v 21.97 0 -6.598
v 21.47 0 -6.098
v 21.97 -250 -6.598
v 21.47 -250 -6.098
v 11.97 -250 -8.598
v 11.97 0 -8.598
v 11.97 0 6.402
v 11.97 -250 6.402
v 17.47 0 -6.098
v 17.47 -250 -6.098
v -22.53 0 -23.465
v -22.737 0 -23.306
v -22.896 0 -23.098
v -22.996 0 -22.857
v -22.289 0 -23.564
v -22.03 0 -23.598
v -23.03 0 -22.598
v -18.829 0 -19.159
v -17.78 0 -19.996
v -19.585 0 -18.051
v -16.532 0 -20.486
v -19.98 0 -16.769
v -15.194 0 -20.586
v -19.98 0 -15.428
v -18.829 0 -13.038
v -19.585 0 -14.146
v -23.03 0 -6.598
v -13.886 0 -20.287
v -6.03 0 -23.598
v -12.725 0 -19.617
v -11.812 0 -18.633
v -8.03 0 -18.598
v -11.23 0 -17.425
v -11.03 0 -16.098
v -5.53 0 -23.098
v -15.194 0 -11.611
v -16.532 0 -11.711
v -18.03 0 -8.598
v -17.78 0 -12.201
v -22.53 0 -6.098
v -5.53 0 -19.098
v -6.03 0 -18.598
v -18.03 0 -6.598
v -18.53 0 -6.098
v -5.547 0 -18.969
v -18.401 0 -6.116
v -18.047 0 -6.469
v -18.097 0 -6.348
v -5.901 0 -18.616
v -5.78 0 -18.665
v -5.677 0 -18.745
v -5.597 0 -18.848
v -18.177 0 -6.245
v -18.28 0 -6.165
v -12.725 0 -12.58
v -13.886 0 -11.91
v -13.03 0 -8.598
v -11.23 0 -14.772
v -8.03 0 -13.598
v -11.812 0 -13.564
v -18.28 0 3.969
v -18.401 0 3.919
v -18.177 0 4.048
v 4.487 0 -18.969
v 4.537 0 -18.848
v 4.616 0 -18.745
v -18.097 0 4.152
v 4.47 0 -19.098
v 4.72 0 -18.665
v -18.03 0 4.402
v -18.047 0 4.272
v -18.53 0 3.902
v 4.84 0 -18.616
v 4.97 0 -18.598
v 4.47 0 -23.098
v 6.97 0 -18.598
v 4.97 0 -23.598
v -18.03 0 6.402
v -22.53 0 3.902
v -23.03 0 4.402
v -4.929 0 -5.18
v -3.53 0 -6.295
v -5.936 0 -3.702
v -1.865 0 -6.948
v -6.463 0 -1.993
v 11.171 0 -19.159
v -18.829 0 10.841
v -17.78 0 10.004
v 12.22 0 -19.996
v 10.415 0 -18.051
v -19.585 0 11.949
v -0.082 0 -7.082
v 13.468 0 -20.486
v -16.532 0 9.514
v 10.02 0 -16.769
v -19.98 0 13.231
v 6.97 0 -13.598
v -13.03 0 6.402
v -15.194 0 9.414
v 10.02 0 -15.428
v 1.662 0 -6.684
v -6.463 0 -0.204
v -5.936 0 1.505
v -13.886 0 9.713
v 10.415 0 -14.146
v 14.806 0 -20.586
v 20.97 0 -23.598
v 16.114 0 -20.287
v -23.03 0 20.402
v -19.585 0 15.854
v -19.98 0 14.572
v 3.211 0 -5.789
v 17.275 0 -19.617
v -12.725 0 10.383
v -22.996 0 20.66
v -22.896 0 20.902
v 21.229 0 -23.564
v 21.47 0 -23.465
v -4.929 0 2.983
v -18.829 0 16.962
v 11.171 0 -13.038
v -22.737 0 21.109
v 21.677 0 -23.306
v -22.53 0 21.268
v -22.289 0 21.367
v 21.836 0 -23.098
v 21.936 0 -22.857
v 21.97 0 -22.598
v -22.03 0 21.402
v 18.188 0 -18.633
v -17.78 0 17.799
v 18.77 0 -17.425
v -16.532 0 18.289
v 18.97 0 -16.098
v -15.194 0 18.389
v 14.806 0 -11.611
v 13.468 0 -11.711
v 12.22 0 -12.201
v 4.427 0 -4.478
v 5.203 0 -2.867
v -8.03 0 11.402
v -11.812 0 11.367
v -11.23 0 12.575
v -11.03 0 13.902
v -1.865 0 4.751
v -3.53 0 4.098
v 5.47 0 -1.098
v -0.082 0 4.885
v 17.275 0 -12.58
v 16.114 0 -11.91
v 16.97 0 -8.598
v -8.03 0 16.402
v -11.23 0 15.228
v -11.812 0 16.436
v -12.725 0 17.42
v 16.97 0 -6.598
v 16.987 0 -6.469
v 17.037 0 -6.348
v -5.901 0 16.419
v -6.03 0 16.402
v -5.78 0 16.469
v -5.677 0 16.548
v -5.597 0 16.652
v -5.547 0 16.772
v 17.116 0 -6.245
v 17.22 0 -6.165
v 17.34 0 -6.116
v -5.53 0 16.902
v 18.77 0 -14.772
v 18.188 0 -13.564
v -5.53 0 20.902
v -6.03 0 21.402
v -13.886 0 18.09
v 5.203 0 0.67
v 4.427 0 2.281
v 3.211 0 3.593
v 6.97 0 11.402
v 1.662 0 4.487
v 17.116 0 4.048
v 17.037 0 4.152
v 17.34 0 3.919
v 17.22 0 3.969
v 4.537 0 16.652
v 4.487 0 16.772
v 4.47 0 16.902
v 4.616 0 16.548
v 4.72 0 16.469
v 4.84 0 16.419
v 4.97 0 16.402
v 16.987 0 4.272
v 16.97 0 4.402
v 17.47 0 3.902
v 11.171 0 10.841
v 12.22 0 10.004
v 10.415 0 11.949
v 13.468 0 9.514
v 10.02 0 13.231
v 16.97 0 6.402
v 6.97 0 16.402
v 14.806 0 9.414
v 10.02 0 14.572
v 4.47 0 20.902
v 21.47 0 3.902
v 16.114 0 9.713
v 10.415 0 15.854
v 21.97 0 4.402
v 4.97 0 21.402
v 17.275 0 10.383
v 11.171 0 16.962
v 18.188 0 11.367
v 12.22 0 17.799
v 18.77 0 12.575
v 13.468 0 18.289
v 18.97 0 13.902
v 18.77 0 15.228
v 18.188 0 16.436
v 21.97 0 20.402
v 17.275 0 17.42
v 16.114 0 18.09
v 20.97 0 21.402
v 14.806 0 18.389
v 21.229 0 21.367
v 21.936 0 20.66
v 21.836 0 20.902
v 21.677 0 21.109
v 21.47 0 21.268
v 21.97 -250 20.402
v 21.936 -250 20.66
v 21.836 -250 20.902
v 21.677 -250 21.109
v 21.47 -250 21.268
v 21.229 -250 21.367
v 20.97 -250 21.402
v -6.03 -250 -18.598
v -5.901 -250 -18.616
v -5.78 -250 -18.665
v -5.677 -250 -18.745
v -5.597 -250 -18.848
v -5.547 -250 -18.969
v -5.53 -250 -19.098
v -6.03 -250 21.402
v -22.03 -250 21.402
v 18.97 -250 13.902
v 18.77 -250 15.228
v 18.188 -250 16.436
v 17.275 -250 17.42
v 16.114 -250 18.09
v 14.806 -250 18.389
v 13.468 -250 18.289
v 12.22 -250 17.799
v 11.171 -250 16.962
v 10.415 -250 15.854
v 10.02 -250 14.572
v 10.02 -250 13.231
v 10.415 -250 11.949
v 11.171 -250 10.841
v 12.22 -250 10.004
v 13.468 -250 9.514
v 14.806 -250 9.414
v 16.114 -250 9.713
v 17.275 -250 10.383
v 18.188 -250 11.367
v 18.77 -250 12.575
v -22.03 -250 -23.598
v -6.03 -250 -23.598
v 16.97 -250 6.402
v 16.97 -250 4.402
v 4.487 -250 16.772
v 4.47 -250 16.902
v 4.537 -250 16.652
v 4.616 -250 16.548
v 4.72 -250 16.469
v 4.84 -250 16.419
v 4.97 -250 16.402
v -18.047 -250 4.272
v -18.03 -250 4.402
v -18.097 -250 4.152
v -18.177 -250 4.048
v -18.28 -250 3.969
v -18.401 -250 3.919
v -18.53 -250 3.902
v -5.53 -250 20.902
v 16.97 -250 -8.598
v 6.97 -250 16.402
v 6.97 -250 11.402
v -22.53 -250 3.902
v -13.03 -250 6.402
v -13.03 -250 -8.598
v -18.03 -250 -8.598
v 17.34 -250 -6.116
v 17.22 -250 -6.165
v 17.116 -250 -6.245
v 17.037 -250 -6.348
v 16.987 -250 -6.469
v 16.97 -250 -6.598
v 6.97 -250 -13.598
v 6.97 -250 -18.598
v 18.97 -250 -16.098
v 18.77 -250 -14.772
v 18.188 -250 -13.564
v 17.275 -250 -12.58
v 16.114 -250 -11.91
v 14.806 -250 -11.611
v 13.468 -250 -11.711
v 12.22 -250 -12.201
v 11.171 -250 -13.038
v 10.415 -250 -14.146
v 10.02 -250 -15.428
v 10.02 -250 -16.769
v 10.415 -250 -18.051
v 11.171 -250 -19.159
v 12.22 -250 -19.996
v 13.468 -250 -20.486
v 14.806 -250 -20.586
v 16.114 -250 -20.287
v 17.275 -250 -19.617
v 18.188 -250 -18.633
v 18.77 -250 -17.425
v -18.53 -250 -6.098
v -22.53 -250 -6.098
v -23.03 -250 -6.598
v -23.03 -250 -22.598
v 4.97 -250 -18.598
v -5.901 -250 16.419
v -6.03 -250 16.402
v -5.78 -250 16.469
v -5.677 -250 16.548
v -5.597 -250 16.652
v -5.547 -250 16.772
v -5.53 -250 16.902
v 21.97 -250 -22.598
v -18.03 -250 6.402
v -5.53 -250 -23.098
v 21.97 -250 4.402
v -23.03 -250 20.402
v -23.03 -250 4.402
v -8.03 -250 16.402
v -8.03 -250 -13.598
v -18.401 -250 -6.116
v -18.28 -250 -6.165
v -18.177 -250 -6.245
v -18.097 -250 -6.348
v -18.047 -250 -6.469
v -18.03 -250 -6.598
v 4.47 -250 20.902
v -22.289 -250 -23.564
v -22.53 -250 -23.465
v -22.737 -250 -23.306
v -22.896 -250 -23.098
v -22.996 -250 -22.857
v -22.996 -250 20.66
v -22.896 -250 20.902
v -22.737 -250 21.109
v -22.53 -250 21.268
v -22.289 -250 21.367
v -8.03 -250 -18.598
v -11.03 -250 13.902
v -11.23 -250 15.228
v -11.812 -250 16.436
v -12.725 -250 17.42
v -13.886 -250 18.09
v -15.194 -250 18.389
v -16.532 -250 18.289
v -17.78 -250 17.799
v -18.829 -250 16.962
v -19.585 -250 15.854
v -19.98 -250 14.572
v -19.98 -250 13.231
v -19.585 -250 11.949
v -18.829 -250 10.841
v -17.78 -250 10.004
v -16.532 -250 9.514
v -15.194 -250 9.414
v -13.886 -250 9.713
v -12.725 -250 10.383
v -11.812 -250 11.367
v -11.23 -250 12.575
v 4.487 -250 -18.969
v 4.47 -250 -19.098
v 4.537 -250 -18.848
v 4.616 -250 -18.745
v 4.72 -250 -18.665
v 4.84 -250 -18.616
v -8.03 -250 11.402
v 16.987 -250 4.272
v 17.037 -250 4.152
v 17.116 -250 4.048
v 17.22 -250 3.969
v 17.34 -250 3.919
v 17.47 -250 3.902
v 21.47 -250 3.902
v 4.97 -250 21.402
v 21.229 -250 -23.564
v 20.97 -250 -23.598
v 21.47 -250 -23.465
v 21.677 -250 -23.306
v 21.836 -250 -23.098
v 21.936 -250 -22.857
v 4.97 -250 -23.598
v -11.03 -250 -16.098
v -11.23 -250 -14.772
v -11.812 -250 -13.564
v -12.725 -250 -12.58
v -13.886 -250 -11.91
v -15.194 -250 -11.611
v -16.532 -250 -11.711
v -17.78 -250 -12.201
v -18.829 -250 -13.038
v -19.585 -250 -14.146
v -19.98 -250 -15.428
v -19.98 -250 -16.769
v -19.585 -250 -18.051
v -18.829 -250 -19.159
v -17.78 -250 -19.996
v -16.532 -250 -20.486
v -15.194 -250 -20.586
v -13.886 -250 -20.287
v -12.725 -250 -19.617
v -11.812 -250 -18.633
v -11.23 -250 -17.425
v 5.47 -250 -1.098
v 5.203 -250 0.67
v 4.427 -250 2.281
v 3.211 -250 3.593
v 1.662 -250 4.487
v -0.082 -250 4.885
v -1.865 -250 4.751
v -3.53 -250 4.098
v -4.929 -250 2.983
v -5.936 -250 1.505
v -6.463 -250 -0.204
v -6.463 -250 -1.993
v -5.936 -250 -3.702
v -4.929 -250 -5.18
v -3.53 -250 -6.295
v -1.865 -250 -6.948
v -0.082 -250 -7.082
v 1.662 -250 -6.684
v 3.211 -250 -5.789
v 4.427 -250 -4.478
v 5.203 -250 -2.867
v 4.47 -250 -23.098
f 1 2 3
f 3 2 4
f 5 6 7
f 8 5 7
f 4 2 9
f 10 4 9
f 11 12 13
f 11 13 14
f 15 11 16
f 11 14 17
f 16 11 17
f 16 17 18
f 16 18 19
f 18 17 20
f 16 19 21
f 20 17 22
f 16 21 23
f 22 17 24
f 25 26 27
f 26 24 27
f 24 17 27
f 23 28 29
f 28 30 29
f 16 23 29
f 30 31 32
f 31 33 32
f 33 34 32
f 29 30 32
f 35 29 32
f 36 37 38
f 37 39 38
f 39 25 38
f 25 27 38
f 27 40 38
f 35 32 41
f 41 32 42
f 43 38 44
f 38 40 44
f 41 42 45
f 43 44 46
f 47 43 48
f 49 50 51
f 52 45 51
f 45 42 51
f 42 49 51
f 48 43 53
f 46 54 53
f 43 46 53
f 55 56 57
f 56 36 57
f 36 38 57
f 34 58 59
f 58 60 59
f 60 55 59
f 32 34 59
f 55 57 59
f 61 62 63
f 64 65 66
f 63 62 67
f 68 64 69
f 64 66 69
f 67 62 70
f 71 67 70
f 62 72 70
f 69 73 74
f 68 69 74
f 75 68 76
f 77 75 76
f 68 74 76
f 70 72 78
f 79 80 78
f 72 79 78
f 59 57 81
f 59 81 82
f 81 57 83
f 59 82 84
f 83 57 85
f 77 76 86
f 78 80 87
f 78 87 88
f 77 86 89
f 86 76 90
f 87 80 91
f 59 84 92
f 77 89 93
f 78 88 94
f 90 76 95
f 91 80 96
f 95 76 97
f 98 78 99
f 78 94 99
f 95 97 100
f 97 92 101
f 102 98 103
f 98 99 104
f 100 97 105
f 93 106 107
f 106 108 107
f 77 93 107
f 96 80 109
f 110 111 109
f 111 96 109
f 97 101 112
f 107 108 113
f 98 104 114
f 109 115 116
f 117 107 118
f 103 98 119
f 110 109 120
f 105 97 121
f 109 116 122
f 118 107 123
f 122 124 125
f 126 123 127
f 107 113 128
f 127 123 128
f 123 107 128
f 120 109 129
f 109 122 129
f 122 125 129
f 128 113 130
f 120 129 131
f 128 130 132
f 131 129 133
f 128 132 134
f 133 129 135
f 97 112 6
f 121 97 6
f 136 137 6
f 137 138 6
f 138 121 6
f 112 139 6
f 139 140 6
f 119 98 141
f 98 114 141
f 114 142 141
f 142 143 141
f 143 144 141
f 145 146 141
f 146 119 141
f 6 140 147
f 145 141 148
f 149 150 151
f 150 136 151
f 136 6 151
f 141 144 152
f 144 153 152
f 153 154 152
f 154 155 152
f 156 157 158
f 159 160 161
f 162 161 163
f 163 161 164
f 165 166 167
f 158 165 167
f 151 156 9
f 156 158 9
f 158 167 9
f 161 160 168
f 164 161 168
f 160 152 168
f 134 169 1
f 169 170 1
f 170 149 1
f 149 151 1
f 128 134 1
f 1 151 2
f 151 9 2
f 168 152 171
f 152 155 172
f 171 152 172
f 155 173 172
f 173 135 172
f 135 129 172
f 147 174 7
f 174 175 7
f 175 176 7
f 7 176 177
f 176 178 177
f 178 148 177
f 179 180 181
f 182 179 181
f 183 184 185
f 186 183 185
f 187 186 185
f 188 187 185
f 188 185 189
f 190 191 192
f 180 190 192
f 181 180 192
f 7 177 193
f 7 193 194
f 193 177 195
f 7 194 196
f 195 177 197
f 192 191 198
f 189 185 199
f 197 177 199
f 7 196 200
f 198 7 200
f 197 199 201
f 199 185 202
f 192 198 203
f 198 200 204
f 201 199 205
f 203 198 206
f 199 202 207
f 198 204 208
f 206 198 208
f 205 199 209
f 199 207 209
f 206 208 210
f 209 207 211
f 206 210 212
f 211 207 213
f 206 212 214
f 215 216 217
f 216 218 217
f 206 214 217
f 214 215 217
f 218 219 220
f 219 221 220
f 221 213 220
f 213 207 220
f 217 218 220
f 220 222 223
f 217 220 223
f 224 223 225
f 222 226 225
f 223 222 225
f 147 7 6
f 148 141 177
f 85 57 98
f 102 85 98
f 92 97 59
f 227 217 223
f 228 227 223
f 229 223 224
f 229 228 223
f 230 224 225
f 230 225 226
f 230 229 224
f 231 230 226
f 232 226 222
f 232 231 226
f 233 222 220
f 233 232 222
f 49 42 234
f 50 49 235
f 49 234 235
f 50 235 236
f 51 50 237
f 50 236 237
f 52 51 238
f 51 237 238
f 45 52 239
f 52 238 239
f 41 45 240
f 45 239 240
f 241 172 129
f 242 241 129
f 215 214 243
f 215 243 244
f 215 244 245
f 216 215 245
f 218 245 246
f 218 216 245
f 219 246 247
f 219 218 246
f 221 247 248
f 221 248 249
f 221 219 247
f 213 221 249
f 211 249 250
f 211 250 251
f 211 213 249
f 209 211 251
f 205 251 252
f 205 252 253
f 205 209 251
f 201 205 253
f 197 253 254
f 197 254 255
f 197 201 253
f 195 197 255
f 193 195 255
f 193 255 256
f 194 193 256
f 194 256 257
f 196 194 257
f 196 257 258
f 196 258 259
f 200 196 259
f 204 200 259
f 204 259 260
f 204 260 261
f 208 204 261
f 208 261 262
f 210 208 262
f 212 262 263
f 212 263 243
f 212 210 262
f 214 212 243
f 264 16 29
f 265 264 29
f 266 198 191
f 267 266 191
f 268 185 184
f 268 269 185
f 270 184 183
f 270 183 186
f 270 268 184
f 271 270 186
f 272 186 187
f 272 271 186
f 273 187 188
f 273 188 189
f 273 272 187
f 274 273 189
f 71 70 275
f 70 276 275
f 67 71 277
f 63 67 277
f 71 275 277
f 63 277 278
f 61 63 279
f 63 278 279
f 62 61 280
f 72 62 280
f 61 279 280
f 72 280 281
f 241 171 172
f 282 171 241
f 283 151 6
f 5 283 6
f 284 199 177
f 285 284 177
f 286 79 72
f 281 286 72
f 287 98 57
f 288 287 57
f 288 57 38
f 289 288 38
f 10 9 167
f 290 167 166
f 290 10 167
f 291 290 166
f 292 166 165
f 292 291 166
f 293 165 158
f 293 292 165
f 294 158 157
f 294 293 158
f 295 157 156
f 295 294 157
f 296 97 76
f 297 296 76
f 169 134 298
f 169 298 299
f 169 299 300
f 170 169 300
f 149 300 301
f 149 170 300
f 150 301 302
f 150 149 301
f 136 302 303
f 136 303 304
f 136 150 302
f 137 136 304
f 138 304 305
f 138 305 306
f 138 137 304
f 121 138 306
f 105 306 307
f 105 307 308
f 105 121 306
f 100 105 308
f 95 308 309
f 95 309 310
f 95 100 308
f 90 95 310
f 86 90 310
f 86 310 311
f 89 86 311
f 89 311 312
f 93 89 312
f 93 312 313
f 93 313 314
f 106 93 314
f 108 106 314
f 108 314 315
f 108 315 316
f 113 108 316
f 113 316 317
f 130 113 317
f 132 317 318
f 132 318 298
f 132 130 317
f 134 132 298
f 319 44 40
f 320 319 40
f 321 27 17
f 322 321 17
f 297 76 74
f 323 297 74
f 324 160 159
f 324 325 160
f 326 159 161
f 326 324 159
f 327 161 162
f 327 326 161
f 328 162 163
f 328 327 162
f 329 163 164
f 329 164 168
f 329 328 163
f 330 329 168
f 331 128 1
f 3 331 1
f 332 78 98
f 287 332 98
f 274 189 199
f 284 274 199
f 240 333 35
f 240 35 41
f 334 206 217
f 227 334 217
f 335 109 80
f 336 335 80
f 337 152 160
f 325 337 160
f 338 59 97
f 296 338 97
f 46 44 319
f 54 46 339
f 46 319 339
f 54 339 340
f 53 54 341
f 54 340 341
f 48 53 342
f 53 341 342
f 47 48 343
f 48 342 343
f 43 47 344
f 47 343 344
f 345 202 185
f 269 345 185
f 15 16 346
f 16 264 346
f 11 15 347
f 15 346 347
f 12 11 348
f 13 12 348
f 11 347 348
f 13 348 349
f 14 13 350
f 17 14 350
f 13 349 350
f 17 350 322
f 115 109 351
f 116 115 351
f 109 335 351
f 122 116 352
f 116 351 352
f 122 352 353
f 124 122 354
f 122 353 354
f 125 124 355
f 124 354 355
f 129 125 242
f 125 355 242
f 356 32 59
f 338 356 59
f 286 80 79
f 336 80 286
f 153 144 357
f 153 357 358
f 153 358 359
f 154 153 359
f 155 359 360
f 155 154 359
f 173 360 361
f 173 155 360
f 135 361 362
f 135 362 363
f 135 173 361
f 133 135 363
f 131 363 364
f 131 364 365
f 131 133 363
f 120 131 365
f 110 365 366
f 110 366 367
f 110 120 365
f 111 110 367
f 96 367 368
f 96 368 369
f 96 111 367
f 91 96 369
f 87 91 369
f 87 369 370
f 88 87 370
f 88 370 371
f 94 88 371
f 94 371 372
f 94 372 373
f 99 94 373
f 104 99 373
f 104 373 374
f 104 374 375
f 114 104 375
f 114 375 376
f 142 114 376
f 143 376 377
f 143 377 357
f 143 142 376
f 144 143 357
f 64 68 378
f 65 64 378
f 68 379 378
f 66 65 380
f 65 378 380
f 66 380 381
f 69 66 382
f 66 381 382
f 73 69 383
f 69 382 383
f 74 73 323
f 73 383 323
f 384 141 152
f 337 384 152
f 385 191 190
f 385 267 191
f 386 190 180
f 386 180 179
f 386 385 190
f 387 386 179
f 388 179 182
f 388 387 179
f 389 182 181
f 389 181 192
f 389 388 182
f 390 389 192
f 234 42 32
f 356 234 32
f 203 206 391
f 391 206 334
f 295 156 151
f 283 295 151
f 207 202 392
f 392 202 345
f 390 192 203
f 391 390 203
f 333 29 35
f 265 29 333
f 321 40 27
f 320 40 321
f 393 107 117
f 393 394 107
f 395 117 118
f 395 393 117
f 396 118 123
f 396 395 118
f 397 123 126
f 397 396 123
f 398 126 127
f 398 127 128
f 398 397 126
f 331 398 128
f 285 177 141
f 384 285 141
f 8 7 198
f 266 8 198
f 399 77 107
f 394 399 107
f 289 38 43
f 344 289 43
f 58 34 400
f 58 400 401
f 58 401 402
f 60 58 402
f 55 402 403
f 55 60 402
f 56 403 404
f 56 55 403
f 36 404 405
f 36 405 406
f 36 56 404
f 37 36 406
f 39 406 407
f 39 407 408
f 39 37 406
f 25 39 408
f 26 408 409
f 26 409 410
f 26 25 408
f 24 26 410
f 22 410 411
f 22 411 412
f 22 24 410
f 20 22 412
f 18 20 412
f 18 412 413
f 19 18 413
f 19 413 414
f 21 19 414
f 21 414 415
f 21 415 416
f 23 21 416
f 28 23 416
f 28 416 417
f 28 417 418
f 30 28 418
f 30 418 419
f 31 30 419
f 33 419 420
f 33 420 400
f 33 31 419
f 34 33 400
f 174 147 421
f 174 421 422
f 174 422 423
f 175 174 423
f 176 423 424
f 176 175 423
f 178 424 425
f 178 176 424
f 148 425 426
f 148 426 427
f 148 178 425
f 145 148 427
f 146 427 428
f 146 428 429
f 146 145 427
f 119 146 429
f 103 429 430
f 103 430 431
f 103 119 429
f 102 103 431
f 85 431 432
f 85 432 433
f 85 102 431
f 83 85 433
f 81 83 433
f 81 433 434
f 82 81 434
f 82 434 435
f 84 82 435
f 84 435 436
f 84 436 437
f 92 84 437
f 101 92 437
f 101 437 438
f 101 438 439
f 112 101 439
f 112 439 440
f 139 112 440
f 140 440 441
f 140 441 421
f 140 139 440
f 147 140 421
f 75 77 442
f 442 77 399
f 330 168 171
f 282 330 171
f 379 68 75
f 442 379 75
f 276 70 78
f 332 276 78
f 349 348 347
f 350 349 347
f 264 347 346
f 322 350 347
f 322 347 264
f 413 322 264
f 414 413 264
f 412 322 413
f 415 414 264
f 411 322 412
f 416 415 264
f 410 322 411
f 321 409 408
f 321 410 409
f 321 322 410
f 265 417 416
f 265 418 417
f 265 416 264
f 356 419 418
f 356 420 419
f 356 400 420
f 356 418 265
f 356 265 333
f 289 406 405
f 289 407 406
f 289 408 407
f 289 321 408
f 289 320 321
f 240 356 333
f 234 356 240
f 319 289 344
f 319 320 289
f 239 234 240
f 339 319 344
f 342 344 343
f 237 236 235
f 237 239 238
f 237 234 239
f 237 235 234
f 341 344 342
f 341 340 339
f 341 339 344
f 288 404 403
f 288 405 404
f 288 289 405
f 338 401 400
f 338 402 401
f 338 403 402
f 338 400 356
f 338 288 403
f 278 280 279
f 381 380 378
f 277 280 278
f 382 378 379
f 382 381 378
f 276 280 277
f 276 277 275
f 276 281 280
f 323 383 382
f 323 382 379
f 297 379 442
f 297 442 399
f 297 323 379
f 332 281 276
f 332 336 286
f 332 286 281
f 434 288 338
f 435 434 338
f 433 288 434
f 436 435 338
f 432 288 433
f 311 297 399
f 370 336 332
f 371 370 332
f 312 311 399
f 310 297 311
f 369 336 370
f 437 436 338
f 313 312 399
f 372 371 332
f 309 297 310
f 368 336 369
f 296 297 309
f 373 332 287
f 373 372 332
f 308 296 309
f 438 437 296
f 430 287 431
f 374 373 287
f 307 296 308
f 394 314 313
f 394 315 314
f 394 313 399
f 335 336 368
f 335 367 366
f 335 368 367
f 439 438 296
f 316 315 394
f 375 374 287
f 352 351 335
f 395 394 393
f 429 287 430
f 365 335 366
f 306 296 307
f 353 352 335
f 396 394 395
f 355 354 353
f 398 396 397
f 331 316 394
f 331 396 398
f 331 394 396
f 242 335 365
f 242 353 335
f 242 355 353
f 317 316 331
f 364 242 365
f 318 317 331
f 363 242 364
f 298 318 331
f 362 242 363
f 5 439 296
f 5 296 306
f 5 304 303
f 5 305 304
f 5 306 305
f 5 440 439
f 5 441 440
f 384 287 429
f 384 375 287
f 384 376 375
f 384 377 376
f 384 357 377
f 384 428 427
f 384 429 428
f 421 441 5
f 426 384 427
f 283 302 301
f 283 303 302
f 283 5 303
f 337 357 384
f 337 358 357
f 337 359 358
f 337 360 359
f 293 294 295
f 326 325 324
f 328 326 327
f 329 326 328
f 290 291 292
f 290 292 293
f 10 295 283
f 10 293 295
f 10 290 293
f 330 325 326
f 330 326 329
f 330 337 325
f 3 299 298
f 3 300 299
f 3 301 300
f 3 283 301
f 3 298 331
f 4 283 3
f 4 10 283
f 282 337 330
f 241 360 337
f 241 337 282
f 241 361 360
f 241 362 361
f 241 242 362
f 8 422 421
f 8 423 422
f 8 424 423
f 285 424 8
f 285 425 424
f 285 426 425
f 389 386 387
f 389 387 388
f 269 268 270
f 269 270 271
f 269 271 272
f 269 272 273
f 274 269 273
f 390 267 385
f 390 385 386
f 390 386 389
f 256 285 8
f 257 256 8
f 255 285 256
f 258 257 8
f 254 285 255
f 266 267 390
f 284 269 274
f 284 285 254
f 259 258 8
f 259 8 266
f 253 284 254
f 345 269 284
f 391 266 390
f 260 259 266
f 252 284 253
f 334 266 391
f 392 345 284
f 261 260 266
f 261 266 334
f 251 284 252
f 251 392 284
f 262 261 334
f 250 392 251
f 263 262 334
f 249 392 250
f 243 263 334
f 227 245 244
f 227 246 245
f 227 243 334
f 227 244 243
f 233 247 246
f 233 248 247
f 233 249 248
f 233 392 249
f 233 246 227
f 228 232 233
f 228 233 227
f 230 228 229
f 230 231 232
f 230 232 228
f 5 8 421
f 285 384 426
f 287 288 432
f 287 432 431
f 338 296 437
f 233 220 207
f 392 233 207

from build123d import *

# Parameters (mm, degrees)
F0_R     = 4.5
F0_R_2   = 6
F1_DEPTH = 250
F2_R     = 1
F3_R     = 0.5
F4_SIZE  = 0.5


with BuildPart() as f1:
    # F0 (on Front) → F1 (new body)
    with BuildSketch(Plane.XZ):
        Polygon((4.469697, -23.598485), (21.969697, -23.598485), (21.969697, -6.098485), (16.969697, -6.098485), (16.969697, -8.598485), (11.969697, -8.598485), (11.969697, 6.401515), (16.969697, 6.401515), (16.969697, 3.901515), (21.969697, 3.901515), (21.969697, 21.401515), (4.469697, 21.401515), (4.469697, 16.401515), (6.969697, 16.401515), (6.969697, 11.401515), (-8.030303, 11.401515), (-8.030303, 16.401515), (-5.530303, 16.401515), (-5.530303, 21.401515), (-23.030303, 21.401515), (-23.030303, 3.901515), (-18.030303, 3.901515), (-18.030303, 6.401515), (-13.030303, 6.401515), (-13.030303, -8.598485), (-18.030303, -8.598485), (-18.030303, -6.098485), (-23.030303, -6.098485), (-23.030303, -23.598485), (-5.530303, -23.598485), (-5.530303, -18.598485), (-8.030303, -18.598485), (-8.030303, -13.598485), (6.969697, -13.598485), (6.969697, -18.598485), (4.469697, -18.598485), align=None)
        with Locations((-15.530303, -16.098485)):
            Circle(F0_R, mode=Mode.SUBTRACT)
        with Locations((14.469697, -16.098485)):
            Circle(F0_R, mode=Mode.SUBTRACT)
        with Locations((-0.530303, -1.098485)):
            Circle(F0_R_2, mode=Mode.SUBTRACT)
        with Locations((-15.530303, 13.901515)):
            Circle(F0_R, mode=Mode.SUBTRACT)
        with Locations((14.469697, 13.901515)):
            Circle(F0_R, mode=Mode.SUBTRACT)
    extrude(amount=F1_DEPTH)

    # F2
    f2_edges = [f1.edges().sort_by_distance(p)[0] for p in [
        (21.969697, -125, 21.401515),
        (21.969697, -125, -23.598485),
        (-23.030303, -125, -23.598485),
        (-23.030303, -125, 21.401515),
    ]]
    fillet(f2_edges, radius=F2_R)

    # F3
    f3_edges = [f1.edges().sort_by_distance(p)[0] for p in [
        (-18.030303, -125, -6.098485),
        (-18.030303, -125, 3.901515),
        (-5.530303, -125, -18.598485),
        (4.469697, -125, -18.598485),
        (16.969697, -125, -6.098485),
        (-5.530303, -125, 16.401515),
        (4.469697, -125, 16.401515),
        (16.969697, -125, 3.901515),
    ]]
    fillet(f3_edges, radius=F3_R)

    # F4
    f4_edges = [f1.edges().sort_by_distance(p)[0] for p in [
        (21.969697, -125, -6.098485),
        (21.969697, -125, 3.901515),
        (4.469697, -125, 21.401515),
        (-5.530303, -125, 21.401515),
        (-23.030303, -125, 3.901515),
        (-23.030303, -125, -6.098485),
        (4.469697, -125, -23.598485),
        (-5.530303, -125, -23.598485),
    ]]
    chamfer(f4_edges, length=F4_SIZE)


solid = f1.part
